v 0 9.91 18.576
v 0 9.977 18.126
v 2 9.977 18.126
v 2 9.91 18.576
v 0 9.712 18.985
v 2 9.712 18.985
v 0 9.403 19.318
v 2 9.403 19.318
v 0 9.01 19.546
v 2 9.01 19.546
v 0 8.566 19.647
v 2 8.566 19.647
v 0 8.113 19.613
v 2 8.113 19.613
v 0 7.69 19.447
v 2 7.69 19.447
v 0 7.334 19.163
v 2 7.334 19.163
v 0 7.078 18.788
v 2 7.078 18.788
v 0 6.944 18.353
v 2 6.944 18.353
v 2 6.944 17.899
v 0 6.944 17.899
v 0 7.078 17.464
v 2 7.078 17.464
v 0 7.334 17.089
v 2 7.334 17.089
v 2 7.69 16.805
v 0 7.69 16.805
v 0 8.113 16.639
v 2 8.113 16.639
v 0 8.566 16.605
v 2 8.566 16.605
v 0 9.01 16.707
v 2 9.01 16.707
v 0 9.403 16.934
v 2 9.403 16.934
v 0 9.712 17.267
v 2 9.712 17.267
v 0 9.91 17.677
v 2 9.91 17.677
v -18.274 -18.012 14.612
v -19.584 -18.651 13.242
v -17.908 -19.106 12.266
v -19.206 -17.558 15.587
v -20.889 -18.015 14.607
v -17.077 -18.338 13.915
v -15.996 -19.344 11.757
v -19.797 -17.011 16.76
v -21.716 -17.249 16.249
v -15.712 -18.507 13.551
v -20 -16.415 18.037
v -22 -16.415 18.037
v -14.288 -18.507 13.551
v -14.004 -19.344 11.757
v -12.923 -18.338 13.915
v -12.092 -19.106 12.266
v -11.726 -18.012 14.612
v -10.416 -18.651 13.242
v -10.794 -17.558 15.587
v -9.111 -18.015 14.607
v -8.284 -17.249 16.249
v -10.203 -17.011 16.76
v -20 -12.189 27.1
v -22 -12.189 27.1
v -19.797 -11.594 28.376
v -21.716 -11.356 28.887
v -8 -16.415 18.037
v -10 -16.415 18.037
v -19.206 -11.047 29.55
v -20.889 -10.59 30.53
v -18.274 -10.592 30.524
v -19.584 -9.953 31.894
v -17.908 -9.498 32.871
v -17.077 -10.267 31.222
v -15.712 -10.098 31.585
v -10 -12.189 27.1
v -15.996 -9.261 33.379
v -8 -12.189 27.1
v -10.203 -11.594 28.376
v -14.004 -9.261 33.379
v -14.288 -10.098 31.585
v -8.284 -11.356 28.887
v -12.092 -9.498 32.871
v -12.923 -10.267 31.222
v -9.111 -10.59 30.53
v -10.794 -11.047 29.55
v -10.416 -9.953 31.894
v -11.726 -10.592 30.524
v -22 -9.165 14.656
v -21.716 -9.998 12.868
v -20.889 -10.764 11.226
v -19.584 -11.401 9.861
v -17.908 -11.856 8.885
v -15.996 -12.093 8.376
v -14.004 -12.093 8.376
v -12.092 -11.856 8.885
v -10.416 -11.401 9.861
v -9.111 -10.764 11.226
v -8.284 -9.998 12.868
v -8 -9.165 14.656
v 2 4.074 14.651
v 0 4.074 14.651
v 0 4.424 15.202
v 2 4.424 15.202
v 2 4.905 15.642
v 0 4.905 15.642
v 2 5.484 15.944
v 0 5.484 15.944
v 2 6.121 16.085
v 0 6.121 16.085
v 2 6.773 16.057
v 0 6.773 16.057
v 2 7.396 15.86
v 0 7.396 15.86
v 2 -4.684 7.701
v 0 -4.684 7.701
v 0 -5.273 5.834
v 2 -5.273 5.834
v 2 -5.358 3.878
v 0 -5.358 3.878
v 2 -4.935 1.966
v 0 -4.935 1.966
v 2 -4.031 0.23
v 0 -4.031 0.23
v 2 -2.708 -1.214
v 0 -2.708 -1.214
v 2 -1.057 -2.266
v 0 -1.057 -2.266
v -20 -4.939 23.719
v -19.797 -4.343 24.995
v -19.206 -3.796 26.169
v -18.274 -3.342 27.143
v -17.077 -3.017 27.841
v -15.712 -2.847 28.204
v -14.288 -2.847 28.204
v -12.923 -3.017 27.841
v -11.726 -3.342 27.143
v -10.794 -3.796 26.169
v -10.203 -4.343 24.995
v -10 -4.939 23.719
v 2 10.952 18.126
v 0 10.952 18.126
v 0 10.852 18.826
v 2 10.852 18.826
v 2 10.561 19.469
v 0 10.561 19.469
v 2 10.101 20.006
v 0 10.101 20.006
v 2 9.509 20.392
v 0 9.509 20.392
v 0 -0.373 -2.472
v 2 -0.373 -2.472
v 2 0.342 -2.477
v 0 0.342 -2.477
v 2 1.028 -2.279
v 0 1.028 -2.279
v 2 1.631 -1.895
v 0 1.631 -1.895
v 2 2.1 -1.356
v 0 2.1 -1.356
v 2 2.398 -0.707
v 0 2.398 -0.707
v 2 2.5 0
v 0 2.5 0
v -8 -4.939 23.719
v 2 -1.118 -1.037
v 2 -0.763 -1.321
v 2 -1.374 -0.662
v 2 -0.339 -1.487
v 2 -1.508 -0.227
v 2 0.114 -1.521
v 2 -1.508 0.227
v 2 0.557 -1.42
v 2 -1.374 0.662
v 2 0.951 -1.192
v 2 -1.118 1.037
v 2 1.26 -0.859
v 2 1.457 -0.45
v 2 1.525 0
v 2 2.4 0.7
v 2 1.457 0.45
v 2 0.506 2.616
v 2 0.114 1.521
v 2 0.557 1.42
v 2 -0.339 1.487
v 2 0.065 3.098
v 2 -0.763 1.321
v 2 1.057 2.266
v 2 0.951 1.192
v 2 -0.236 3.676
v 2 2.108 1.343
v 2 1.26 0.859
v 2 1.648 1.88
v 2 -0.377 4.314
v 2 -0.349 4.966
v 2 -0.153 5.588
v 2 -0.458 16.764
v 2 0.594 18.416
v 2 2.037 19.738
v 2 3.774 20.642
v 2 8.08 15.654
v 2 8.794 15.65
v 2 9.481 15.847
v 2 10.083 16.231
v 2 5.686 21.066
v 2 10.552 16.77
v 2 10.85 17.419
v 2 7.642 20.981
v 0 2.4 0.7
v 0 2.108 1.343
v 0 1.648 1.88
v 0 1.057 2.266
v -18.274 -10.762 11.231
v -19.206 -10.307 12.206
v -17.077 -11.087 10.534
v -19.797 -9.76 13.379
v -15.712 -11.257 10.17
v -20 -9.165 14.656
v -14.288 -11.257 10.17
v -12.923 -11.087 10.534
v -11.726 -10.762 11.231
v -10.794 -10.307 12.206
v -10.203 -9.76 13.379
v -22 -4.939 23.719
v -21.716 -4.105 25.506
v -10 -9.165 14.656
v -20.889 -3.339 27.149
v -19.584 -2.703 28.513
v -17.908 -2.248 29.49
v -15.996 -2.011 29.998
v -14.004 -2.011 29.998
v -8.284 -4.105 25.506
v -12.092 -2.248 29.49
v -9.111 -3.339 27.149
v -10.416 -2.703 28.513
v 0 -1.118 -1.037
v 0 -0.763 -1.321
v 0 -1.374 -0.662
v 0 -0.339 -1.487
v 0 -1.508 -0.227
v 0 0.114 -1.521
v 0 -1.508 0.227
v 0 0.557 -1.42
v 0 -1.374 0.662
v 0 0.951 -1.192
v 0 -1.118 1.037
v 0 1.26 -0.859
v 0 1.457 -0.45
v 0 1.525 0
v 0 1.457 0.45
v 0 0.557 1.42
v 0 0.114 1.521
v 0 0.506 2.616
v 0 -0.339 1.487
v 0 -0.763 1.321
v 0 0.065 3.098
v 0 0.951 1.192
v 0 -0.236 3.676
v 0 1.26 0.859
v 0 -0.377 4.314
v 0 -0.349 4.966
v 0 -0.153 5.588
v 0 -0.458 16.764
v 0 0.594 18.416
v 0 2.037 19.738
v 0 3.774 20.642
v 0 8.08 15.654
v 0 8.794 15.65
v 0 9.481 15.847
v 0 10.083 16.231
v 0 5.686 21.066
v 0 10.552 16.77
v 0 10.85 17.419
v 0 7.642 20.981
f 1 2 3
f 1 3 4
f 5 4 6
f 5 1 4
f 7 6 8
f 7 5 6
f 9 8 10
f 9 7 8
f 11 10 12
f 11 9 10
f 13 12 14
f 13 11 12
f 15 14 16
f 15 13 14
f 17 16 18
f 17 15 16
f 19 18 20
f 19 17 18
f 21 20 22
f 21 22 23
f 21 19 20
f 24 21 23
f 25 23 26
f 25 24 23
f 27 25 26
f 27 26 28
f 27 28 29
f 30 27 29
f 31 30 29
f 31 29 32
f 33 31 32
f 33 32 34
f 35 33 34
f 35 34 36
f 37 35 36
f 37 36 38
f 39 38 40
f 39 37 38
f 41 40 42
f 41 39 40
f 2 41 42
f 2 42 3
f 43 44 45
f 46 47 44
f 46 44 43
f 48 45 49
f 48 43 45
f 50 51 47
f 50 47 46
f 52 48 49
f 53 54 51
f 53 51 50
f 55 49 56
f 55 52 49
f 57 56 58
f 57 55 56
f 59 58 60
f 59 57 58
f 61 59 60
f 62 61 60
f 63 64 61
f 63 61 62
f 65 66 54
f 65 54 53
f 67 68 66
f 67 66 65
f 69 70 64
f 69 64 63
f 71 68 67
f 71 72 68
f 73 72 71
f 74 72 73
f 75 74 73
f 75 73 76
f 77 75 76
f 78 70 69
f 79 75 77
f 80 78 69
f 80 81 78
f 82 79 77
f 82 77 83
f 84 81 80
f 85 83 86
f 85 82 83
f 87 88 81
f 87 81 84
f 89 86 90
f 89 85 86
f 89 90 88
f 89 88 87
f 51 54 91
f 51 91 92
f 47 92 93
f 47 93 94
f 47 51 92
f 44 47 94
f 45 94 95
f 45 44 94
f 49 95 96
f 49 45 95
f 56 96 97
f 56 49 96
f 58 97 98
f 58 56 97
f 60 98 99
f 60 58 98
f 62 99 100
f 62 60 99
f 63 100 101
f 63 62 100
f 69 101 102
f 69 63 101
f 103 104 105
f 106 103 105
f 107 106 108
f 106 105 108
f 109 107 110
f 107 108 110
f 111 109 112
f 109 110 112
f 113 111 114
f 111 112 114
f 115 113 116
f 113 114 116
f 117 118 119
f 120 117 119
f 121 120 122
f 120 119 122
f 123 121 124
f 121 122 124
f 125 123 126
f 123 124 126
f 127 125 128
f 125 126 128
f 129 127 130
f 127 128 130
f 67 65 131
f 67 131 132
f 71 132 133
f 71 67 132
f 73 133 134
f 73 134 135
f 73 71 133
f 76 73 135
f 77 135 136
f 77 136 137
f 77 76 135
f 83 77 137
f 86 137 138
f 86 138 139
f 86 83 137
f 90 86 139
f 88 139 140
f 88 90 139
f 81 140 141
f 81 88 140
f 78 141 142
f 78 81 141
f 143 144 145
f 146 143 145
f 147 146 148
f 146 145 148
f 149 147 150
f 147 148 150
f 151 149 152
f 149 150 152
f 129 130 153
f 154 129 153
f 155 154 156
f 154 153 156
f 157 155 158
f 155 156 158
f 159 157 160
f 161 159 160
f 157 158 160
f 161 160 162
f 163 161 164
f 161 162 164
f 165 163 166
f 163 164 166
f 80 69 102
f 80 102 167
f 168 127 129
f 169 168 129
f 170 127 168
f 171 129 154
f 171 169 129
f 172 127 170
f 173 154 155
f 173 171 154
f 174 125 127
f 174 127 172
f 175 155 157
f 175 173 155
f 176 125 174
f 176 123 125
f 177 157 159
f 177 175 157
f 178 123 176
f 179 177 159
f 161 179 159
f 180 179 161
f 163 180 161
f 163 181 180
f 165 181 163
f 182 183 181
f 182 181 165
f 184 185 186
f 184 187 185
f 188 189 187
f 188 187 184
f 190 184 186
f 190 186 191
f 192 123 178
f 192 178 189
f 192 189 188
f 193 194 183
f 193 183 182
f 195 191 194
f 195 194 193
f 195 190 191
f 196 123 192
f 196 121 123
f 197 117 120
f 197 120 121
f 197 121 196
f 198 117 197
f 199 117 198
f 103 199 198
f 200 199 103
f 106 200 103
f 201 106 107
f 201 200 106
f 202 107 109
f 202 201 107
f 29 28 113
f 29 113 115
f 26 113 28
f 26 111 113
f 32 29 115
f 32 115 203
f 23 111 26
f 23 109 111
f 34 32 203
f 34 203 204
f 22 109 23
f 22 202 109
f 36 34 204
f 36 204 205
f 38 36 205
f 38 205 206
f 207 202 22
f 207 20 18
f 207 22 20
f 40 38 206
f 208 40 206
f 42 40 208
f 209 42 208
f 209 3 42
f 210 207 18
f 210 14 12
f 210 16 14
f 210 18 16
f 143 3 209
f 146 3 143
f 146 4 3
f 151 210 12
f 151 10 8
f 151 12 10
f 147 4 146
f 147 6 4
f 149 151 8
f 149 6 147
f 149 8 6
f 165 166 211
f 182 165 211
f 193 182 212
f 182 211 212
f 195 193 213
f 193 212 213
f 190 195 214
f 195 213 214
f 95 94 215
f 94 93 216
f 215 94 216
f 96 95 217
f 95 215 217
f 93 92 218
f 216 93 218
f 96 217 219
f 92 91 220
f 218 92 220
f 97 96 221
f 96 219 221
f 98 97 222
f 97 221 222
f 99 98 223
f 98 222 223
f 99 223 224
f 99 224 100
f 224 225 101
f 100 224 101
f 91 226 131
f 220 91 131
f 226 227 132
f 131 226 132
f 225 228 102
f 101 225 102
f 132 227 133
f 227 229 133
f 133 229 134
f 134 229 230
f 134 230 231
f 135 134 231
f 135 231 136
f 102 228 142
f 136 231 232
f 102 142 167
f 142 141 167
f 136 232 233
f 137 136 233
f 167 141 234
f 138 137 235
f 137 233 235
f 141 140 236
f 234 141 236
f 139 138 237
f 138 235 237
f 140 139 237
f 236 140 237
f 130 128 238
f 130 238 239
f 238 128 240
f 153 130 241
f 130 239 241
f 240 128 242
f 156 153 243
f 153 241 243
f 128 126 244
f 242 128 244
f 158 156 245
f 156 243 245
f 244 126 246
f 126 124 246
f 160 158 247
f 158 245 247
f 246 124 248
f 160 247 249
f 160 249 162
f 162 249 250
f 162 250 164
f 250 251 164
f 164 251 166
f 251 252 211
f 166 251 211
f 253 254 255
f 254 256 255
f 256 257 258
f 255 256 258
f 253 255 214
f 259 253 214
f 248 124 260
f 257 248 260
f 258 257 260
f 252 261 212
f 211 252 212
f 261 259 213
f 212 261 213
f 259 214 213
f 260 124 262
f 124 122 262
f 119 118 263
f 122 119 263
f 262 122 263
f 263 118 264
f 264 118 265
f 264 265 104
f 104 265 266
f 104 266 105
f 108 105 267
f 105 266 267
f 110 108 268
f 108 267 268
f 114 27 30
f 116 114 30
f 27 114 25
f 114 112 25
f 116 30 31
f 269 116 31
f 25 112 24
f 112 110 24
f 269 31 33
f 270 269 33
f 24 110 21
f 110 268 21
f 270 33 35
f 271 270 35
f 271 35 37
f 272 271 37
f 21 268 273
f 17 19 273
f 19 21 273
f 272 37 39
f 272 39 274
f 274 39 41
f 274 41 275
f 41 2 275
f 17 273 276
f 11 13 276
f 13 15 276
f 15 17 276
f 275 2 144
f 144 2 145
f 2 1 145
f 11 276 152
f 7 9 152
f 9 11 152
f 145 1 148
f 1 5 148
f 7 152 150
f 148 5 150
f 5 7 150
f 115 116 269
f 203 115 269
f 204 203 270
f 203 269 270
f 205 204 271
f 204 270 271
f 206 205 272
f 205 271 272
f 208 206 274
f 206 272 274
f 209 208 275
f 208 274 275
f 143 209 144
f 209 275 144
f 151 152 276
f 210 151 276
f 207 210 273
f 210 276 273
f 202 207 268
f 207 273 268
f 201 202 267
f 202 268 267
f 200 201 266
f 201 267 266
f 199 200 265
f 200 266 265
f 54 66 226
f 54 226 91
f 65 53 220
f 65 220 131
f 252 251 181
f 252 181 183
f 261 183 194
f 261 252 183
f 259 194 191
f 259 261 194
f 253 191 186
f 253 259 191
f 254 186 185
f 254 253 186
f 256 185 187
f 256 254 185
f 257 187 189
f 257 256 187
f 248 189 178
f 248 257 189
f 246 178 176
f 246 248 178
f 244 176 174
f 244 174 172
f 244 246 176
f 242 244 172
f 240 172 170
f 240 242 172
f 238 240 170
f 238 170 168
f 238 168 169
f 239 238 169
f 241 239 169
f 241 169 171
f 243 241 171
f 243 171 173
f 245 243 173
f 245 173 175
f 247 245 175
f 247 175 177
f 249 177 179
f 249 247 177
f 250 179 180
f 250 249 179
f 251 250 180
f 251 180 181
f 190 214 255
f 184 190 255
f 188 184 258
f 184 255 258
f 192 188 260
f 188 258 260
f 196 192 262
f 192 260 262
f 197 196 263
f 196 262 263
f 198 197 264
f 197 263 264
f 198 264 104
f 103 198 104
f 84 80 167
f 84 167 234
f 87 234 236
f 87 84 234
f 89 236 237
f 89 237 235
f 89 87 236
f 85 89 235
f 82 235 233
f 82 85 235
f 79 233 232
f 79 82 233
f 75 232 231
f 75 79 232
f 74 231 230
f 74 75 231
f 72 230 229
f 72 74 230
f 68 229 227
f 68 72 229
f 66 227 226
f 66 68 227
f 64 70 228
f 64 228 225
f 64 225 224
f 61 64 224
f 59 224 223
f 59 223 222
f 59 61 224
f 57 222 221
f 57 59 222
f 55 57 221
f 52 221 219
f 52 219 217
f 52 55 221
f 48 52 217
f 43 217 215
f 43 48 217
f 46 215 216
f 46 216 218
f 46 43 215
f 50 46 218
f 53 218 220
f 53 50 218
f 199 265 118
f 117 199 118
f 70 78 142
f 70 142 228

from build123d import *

# Parameters (mm, degrees)
F0_R     = 1.525
F1_DEPTH = 2
F4_DEPTH = 8


with BuildPart() as f1:
    # F0 (on Right) → F1 (new body)
    with BuildSketch(Plane.YZ):
        with BuildLine():
            ThreePointArc((-1.0565456544, -2.2657694676), (1.3432490209, -2.1084786145), (2.5, 0))
            ThreePointArc((2.5, 0), (2.1084786145, 1.3432490209), (1.0565456544, 2.2657694676))
            ThreePointArc((1.0565456544, 2.2657694676), (-2.2657694676, 1.0565456544), (-1.0565456544, -2.2657694676))
        make_face()
        Circle(F0_R, mode=Mode.SUBTRACT)
        with BuildLine():
            ThreePointArc((-1.0565456544, -2.2657694676), (-2.2657694676, 1.0565456544), (1.0565456544, 2.2657694676))
            ThreePointArc((1.0565456544, 2.2657694676), (-0.2361402433, 3.6764885769), (-0.1526781589, 5.5880845895))
            Line((-0.1526781589, 5.5880845895), (4.0735044585, 14.6511624599))
            ThreePointArc((4.0735044585, 14.6511624599), (5.4842235678, 15.9438483575), (7.3958195805, 15.8603862731))
            ThreePointArc((7.3958195805, 15.8603862731), (6.1865957672, 19.1827013951), (9.5089108892, 20.3919252083))
            ThreePointArc((9.5089108892, 20.3919252083), (3.7741228512, 20.6423114614), (-0.4580344767, 16.7642537686))
            Line((-0.4580344767, 16.7642537686), (-4.6842170941, 7.7011758982))
            ThreePointArc((-4.6842170941, 7.7011758982), (-4.9346033472, 1.9663878602), (-1.0565456544, -2.2657694676))
        make_face()
        with BuildLine():
            ThreePointArc((9.5089108892, 20.3919252083), (6.1865957672, 19.1827013951), (7.3958195805, 15.8603862731))
            ThreePointArc((7.3958195805, 15.8603862731), (9.7956142557, 16.0176771262), (10.9523652348, 18.1261557407))
            ThreePointArc((10.9523652348, 18.1261557407), (10.5608438493, 19.4694047616), (9.5089108892, 20.3919252083))
        make_face()
        with Locations((8.4523652348, 18.1261557407)):
            Circle(F0_R, mode=Mode.SUBTRACT)
    extrude(amount=F1_DEPTH)


with BuildPart() as f4:
    # F3 (on offset) → F4 (new body)
    with BuildSketch(Plane(origin=(0, -20.3919252083, 9.5089108892), x_dir=(1, 0, 0), z_dir=(0, -0.906307787, 0.4226182617))):
        with BuildLine():
            ThreePointArc((-8, 19.4092413783), (-15, 26.4092413783), (-22, 19.4092413783))
            Line((-22, 19.4092413783), (-22, 9.4092413783))
            ThreePointArc((-22, 9.4092413783), (-15, 2.4092413783), (-8, 9.4092413783))
            Line((-8, 9.4092413783), (-8, 19.4092413783))
        make_face()
        with BuildLine():
            Line((-10, 19.4092413783), (-10, 9.4092413783))
            ThreePointArc((-10, 9.4092413783), (-15, 4.4092413783), (-20, 9.4092413783))
            Line((-20, 9.4092413783), (-20, 19.4092413783))
            ThreePointArc((-20, 19.4092413783), (-15, 24.4092413783), (-10, 19.4092413783))
        make_face(mode=Mode.SUBTRACT)
    extrude(amount=-F4_DEPTH)


solid = Compound([f1.part, f4.part])
